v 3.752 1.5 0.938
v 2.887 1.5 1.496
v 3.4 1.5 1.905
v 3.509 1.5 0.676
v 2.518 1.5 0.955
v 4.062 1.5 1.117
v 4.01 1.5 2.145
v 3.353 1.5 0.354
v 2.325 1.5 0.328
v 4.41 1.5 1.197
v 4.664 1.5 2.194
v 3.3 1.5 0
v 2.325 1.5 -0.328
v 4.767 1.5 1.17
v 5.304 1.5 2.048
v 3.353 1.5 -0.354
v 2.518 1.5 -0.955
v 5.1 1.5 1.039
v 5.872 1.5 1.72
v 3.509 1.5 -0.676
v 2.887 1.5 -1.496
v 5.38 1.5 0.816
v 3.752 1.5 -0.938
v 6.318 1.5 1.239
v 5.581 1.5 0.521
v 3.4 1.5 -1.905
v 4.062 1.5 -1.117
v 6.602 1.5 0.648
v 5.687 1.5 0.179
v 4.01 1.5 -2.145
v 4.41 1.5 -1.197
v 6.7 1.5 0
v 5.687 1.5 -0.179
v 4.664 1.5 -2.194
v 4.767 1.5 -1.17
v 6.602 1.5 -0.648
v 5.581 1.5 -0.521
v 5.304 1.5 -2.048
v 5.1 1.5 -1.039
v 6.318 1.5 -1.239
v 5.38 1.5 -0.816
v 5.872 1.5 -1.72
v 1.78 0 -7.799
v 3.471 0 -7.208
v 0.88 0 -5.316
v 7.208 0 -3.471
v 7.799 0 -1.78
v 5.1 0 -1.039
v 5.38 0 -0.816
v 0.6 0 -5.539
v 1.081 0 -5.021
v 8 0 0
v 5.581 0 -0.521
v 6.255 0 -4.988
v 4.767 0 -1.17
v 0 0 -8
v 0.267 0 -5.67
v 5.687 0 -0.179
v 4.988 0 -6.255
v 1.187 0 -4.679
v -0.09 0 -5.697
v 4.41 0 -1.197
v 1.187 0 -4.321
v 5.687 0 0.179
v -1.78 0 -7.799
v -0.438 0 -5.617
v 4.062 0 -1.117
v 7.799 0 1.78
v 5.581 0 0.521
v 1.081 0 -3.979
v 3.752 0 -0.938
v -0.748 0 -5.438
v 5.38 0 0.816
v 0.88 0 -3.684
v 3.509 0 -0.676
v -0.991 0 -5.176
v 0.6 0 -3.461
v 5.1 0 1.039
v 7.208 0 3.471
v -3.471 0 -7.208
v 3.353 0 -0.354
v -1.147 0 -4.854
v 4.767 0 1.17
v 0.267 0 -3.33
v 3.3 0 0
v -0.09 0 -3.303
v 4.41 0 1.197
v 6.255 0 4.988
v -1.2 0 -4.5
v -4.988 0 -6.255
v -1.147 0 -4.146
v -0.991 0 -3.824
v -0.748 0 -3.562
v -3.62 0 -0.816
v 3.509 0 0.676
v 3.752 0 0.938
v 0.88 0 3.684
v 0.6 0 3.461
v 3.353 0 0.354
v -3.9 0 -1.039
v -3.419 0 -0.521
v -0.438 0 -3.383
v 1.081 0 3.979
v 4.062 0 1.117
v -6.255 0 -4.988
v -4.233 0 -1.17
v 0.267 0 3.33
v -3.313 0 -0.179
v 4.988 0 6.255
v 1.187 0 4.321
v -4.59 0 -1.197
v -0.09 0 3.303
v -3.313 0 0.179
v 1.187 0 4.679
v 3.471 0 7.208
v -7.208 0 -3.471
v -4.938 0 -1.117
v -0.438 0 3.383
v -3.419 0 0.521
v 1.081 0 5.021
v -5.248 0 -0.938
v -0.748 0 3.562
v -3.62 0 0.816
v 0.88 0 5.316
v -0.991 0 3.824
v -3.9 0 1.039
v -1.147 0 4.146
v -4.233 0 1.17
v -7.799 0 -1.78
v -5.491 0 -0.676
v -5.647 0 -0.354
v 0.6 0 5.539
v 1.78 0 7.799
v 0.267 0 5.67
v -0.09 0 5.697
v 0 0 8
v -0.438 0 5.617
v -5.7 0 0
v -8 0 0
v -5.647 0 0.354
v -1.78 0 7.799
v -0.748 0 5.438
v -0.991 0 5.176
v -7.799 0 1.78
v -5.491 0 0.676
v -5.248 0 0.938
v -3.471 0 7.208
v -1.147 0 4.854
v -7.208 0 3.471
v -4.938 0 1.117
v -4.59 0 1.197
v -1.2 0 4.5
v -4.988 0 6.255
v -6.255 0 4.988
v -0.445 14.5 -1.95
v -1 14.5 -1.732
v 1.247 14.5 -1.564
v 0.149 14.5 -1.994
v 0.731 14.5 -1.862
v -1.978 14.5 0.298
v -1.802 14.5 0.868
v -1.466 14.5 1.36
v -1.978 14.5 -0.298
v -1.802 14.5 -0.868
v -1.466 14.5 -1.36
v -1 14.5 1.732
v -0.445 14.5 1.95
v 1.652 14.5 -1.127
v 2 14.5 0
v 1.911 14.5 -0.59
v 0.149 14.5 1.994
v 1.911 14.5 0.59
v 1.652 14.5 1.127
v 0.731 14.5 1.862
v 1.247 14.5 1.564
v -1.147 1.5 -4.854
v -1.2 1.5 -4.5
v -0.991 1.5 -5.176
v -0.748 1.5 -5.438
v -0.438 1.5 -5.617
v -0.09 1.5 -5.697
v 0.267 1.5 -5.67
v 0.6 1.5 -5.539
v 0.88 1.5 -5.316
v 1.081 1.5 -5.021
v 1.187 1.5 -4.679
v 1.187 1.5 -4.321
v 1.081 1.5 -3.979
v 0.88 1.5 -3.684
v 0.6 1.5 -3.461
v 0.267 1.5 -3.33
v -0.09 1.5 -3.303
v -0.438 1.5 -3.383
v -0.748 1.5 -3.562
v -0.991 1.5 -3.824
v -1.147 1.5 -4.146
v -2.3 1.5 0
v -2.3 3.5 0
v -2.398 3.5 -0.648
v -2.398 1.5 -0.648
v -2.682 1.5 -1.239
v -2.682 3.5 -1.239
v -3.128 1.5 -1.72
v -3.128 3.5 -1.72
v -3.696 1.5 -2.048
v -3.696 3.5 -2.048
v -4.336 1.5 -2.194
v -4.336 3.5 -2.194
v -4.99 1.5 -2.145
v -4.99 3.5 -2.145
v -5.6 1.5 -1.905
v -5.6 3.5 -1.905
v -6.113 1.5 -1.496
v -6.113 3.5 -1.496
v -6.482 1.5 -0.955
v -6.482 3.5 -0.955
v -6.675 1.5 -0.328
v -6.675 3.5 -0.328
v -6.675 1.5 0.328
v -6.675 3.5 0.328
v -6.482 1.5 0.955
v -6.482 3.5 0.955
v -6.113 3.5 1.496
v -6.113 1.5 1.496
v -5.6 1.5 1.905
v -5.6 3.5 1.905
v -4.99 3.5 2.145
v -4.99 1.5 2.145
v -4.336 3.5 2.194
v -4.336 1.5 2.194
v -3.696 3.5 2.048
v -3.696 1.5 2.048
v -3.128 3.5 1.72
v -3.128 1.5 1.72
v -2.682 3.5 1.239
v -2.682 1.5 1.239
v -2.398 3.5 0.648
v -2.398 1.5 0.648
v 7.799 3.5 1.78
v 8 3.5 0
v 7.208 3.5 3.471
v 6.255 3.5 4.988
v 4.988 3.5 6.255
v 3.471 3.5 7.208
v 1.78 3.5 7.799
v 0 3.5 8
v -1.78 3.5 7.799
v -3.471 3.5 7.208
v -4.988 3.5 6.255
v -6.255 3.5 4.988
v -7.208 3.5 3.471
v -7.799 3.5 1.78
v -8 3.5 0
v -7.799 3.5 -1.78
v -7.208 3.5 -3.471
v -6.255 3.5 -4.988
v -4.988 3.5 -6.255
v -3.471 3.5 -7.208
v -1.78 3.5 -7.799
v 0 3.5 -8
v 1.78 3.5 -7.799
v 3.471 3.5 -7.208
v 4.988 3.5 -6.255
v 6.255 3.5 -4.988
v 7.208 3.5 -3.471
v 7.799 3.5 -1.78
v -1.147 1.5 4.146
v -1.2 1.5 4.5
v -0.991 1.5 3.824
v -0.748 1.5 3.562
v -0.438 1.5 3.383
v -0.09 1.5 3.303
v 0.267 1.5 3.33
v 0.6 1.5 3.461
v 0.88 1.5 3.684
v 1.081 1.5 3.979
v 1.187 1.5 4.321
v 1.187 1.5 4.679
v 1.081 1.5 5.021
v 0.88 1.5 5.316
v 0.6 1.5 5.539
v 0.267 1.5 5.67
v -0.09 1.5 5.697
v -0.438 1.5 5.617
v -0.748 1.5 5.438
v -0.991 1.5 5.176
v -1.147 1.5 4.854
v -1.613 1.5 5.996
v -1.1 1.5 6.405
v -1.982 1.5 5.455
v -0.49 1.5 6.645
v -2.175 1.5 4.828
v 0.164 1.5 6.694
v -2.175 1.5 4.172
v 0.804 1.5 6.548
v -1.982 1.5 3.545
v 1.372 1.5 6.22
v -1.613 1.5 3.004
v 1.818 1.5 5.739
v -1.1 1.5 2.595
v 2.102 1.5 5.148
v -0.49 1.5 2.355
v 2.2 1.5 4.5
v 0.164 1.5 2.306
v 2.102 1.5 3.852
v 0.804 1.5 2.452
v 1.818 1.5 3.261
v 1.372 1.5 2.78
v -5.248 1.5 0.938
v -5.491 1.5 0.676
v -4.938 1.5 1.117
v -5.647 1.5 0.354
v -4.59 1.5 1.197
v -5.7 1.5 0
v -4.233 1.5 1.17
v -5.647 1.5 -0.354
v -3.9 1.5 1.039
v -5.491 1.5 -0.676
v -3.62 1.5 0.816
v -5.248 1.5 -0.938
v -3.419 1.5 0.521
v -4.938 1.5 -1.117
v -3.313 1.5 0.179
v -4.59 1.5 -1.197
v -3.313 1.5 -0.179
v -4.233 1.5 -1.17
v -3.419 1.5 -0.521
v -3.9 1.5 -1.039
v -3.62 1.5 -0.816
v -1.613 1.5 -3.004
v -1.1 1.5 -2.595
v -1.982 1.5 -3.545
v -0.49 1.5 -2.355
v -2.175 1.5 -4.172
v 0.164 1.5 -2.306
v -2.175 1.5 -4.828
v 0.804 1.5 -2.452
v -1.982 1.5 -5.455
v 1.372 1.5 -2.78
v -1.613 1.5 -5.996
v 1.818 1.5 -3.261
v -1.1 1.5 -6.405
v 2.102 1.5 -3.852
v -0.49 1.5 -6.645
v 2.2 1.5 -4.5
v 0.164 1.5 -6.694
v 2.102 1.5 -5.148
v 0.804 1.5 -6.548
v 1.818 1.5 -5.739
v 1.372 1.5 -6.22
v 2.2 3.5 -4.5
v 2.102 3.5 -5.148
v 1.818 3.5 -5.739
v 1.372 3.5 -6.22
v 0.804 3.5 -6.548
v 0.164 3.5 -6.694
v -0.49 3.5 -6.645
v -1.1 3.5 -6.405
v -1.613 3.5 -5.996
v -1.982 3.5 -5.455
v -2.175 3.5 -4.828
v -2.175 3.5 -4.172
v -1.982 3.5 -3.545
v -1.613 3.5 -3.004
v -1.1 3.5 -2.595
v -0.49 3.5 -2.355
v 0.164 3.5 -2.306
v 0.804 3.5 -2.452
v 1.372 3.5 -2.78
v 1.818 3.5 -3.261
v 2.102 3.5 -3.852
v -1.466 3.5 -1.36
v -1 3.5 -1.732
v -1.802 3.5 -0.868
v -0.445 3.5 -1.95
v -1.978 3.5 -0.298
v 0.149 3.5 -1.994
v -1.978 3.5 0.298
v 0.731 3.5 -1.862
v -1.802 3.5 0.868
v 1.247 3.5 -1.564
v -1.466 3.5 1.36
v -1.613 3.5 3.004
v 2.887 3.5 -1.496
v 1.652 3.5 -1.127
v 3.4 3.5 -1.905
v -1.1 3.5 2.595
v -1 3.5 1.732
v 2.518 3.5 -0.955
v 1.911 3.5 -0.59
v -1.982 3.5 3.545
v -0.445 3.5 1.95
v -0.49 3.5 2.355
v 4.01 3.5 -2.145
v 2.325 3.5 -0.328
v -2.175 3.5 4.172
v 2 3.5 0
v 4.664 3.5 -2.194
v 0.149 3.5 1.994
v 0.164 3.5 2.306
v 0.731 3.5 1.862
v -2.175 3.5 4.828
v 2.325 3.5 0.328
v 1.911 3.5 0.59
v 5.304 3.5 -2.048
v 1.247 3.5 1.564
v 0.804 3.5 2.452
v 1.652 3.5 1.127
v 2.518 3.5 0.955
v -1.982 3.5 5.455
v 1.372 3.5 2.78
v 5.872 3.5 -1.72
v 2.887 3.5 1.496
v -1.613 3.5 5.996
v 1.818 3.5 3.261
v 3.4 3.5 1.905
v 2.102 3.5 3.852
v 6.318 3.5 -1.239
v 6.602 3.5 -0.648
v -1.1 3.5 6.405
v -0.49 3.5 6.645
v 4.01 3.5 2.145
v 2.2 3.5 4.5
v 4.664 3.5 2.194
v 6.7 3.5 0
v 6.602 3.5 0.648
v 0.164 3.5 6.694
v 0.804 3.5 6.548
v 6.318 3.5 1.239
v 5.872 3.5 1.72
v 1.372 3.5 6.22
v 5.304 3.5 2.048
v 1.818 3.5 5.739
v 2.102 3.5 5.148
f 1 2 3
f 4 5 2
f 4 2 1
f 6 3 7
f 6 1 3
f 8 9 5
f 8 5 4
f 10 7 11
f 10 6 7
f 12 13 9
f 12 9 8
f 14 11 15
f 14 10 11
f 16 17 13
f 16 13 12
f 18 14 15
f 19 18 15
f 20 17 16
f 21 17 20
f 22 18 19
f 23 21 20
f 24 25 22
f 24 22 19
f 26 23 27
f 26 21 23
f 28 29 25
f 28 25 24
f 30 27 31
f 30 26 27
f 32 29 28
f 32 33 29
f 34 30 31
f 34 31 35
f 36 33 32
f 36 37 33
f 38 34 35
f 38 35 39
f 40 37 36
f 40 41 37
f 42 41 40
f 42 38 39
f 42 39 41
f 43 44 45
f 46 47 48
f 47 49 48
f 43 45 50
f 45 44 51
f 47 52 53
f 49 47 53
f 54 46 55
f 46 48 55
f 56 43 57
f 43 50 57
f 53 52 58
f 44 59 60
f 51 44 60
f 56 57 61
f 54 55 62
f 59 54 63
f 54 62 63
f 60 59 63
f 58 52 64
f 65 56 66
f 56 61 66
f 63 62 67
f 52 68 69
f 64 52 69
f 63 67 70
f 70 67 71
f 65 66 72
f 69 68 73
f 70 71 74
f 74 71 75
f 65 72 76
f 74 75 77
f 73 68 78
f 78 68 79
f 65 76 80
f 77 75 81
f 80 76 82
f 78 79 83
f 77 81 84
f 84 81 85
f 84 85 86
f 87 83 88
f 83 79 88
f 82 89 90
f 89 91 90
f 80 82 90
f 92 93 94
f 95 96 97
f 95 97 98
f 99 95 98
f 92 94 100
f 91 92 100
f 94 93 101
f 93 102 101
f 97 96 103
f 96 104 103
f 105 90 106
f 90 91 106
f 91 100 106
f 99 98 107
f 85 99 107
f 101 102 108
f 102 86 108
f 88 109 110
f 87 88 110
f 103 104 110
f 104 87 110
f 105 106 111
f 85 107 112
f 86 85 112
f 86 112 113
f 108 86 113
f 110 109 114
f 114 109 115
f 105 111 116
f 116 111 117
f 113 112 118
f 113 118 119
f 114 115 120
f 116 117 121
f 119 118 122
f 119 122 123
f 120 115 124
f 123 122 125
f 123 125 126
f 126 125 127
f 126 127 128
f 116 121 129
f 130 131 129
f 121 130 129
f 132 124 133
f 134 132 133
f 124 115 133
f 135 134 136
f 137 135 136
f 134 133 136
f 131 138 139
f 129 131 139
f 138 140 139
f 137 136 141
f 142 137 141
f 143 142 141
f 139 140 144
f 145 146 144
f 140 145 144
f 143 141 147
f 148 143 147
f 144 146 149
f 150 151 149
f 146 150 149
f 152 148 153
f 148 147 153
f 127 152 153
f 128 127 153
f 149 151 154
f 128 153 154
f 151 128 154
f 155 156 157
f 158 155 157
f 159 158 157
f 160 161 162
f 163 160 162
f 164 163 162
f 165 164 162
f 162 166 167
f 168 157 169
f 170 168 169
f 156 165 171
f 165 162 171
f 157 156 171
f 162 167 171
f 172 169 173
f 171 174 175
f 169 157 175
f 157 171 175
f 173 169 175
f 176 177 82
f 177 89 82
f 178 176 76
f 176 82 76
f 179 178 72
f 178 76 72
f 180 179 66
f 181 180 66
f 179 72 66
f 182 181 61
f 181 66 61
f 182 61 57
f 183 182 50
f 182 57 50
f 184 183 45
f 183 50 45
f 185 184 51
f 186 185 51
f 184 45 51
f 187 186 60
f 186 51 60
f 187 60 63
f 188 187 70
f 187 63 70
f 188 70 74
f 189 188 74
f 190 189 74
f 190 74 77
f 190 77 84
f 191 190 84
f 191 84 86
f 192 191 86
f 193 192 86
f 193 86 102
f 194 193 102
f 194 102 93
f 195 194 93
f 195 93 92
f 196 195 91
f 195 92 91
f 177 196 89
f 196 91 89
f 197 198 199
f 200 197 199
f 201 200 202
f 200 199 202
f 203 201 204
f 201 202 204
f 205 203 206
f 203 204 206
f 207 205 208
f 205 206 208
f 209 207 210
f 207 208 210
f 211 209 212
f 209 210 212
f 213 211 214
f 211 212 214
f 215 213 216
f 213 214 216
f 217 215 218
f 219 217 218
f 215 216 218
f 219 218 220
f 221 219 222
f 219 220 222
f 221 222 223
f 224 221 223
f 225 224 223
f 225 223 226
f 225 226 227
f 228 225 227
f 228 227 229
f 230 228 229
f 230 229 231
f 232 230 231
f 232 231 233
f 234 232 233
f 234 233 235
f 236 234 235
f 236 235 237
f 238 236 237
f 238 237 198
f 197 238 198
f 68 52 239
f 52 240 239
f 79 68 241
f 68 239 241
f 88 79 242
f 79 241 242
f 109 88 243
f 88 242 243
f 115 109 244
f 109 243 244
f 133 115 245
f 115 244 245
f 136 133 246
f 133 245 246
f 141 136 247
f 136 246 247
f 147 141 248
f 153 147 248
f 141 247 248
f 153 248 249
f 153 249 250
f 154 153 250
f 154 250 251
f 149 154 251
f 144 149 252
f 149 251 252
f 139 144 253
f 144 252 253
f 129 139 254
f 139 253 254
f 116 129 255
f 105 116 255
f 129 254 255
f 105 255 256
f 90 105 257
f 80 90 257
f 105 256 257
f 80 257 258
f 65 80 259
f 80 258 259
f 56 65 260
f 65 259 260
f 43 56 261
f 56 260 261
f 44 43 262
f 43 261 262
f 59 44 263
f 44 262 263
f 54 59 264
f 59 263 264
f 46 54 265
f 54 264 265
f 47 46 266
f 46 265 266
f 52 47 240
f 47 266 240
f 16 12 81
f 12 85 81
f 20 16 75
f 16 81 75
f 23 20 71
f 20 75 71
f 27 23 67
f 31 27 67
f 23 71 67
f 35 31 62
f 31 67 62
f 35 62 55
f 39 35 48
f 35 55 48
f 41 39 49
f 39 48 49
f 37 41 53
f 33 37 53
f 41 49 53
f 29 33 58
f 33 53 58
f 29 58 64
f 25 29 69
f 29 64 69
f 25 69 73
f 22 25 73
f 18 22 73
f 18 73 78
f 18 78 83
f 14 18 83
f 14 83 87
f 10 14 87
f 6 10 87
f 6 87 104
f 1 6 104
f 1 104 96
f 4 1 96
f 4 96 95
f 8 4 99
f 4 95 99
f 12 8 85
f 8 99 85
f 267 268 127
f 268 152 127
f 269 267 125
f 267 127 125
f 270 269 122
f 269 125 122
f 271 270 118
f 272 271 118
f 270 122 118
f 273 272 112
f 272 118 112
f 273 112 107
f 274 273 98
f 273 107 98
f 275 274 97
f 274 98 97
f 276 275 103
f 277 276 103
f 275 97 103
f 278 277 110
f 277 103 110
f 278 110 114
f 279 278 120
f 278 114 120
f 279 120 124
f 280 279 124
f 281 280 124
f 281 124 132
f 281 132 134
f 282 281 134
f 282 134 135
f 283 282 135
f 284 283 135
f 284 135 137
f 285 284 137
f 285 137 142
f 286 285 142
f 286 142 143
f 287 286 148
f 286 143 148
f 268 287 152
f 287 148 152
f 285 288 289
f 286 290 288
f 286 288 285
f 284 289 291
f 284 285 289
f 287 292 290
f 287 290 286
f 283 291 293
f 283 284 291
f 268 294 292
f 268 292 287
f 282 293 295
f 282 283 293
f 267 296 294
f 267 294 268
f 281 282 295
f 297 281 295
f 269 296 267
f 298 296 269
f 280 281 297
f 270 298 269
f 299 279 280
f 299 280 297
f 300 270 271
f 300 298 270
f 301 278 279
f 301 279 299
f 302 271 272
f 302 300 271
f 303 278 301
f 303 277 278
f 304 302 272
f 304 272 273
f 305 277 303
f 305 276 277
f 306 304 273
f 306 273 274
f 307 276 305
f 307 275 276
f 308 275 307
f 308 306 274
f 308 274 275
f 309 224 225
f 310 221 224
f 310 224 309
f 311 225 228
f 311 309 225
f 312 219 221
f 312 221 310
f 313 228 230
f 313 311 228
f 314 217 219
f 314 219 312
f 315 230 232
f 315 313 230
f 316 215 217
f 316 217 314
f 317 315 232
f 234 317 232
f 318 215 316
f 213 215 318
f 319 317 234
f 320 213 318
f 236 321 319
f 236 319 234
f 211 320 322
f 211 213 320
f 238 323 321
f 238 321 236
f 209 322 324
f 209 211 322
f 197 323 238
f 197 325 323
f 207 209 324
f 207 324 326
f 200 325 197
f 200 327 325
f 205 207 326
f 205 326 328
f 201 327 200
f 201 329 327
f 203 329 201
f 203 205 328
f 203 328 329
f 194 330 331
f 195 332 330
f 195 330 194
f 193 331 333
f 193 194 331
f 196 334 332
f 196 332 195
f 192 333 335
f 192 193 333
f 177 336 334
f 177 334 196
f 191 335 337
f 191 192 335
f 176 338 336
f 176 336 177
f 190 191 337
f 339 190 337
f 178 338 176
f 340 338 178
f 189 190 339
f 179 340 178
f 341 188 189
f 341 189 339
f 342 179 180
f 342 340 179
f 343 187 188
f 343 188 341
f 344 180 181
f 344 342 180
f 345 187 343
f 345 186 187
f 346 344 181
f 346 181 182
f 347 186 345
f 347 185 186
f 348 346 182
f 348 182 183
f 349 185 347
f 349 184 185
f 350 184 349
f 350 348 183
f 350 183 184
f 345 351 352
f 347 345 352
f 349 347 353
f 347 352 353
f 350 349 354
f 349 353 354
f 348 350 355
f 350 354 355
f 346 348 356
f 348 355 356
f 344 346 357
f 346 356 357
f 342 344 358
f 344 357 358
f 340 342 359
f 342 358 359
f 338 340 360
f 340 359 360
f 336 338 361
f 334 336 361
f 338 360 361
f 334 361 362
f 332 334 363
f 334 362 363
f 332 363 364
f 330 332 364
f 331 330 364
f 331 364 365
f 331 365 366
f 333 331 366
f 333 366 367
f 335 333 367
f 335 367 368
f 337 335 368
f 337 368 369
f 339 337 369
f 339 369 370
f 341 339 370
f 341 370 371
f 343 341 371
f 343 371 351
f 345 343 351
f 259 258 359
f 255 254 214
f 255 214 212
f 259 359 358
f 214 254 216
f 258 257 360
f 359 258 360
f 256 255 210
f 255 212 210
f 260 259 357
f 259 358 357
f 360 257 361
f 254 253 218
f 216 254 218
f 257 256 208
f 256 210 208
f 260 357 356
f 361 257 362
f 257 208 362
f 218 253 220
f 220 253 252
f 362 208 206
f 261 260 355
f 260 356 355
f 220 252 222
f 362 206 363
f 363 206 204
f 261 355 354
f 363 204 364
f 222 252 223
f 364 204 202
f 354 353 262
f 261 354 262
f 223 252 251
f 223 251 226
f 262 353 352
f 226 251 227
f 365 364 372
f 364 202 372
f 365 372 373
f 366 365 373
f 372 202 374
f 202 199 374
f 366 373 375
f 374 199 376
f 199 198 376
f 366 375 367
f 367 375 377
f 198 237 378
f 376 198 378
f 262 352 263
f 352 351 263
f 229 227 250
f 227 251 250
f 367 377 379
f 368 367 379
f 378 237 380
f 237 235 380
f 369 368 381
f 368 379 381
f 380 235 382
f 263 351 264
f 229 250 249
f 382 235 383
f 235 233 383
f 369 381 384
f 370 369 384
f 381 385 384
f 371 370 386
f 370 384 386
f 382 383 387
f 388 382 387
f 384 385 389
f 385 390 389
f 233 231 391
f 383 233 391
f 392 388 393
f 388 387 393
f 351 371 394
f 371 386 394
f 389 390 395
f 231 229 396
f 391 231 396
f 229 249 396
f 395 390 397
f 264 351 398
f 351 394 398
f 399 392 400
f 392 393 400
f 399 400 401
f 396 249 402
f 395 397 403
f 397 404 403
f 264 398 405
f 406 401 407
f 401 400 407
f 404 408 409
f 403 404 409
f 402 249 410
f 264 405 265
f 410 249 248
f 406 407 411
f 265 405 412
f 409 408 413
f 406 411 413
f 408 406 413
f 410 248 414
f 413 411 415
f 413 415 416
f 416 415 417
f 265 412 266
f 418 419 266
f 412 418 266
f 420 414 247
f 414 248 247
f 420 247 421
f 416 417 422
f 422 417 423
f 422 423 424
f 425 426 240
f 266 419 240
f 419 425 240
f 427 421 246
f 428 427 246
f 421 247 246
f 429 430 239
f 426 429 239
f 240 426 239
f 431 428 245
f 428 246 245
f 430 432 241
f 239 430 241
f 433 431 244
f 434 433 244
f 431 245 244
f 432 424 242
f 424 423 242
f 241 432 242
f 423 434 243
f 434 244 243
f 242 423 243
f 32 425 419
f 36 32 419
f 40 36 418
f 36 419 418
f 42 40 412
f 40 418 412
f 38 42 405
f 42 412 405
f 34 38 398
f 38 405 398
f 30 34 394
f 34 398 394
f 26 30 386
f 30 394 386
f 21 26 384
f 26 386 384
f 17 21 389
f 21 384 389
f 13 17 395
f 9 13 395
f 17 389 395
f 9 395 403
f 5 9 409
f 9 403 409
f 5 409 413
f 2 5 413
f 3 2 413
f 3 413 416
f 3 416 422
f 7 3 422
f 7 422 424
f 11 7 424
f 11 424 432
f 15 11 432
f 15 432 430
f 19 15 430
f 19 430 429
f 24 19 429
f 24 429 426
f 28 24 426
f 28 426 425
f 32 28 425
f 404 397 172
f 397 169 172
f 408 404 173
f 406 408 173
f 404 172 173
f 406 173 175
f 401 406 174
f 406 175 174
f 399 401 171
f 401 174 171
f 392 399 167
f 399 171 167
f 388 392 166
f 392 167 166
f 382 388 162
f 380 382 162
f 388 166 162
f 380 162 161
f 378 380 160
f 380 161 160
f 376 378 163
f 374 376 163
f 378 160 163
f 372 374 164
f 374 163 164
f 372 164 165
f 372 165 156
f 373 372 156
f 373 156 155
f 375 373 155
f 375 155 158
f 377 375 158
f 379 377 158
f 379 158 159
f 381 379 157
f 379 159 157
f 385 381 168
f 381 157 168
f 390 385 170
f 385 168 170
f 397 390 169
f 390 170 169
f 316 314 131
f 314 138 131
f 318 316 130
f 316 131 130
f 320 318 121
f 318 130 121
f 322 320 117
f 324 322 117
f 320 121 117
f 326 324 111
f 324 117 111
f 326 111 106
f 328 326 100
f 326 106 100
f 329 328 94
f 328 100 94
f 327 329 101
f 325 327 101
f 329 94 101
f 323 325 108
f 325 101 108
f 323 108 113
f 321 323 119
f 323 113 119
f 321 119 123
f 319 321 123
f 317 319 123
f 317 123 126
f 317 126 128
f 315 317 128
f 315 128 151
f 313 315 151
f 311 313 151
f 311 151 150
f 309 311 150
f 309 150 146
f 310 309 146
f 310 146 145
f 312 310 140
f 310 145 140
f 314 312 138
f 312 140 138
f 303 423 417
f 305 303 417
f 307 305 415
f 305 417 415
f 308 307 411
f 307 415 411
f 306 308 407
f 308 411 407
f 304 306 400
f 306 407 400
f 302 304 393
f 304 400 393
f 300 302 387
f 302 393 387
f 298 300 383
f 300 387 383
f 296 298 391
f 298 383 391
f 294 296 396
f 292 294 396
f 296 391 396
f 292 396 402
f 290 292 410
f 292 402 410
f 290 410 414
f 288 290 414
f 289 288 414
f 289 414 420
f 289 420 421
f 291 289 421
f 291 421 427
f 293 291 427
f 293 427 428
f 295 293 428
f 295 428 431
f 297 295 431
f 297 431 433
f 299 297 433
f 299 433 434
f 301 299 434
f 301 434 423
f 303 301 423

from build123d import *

# Parameters (mm, degrees)
CBORE_FOR_M2_SHCS2_D           = 2.4
CBORE_FOR_M2_SHCS2_CBORE_D     = 4.4
CBORE_FOR_M2_SHCS2_CBORE_DEPTH = 2


with BuildPart() as part:
    # Sketch3 → Revolve1 (revolve)
    with BuildSketch(Plane.XY):
        Polygon((0, 0), (8, 0), (8, 3.5), (2, 3.5), (2, 14.5), (0, 14.5), align=None)
    revolve(axis=Axis((0, 14.5, 0), (0, -1, 0)))

    # CBORE for M2 SHCS2 (through all)
    with Locations(Plane(origin=(0, 3.5, 0), x_dir=(1, 0, 0), z_dir=(0, 1, 0))):
        with Locations((4.5, 0), (0, -4.5), (0, 4.5), (-4.5, 0)):
            CounterBoreHole(CBORE_FOR_M2_SHCS2_D / 2, CBORE_FOR_M2_SHCS2_CBORE_D / 2, CBORE_FOR_M2_SHCS2_CBORE_DEPTH)


solid = part.part
